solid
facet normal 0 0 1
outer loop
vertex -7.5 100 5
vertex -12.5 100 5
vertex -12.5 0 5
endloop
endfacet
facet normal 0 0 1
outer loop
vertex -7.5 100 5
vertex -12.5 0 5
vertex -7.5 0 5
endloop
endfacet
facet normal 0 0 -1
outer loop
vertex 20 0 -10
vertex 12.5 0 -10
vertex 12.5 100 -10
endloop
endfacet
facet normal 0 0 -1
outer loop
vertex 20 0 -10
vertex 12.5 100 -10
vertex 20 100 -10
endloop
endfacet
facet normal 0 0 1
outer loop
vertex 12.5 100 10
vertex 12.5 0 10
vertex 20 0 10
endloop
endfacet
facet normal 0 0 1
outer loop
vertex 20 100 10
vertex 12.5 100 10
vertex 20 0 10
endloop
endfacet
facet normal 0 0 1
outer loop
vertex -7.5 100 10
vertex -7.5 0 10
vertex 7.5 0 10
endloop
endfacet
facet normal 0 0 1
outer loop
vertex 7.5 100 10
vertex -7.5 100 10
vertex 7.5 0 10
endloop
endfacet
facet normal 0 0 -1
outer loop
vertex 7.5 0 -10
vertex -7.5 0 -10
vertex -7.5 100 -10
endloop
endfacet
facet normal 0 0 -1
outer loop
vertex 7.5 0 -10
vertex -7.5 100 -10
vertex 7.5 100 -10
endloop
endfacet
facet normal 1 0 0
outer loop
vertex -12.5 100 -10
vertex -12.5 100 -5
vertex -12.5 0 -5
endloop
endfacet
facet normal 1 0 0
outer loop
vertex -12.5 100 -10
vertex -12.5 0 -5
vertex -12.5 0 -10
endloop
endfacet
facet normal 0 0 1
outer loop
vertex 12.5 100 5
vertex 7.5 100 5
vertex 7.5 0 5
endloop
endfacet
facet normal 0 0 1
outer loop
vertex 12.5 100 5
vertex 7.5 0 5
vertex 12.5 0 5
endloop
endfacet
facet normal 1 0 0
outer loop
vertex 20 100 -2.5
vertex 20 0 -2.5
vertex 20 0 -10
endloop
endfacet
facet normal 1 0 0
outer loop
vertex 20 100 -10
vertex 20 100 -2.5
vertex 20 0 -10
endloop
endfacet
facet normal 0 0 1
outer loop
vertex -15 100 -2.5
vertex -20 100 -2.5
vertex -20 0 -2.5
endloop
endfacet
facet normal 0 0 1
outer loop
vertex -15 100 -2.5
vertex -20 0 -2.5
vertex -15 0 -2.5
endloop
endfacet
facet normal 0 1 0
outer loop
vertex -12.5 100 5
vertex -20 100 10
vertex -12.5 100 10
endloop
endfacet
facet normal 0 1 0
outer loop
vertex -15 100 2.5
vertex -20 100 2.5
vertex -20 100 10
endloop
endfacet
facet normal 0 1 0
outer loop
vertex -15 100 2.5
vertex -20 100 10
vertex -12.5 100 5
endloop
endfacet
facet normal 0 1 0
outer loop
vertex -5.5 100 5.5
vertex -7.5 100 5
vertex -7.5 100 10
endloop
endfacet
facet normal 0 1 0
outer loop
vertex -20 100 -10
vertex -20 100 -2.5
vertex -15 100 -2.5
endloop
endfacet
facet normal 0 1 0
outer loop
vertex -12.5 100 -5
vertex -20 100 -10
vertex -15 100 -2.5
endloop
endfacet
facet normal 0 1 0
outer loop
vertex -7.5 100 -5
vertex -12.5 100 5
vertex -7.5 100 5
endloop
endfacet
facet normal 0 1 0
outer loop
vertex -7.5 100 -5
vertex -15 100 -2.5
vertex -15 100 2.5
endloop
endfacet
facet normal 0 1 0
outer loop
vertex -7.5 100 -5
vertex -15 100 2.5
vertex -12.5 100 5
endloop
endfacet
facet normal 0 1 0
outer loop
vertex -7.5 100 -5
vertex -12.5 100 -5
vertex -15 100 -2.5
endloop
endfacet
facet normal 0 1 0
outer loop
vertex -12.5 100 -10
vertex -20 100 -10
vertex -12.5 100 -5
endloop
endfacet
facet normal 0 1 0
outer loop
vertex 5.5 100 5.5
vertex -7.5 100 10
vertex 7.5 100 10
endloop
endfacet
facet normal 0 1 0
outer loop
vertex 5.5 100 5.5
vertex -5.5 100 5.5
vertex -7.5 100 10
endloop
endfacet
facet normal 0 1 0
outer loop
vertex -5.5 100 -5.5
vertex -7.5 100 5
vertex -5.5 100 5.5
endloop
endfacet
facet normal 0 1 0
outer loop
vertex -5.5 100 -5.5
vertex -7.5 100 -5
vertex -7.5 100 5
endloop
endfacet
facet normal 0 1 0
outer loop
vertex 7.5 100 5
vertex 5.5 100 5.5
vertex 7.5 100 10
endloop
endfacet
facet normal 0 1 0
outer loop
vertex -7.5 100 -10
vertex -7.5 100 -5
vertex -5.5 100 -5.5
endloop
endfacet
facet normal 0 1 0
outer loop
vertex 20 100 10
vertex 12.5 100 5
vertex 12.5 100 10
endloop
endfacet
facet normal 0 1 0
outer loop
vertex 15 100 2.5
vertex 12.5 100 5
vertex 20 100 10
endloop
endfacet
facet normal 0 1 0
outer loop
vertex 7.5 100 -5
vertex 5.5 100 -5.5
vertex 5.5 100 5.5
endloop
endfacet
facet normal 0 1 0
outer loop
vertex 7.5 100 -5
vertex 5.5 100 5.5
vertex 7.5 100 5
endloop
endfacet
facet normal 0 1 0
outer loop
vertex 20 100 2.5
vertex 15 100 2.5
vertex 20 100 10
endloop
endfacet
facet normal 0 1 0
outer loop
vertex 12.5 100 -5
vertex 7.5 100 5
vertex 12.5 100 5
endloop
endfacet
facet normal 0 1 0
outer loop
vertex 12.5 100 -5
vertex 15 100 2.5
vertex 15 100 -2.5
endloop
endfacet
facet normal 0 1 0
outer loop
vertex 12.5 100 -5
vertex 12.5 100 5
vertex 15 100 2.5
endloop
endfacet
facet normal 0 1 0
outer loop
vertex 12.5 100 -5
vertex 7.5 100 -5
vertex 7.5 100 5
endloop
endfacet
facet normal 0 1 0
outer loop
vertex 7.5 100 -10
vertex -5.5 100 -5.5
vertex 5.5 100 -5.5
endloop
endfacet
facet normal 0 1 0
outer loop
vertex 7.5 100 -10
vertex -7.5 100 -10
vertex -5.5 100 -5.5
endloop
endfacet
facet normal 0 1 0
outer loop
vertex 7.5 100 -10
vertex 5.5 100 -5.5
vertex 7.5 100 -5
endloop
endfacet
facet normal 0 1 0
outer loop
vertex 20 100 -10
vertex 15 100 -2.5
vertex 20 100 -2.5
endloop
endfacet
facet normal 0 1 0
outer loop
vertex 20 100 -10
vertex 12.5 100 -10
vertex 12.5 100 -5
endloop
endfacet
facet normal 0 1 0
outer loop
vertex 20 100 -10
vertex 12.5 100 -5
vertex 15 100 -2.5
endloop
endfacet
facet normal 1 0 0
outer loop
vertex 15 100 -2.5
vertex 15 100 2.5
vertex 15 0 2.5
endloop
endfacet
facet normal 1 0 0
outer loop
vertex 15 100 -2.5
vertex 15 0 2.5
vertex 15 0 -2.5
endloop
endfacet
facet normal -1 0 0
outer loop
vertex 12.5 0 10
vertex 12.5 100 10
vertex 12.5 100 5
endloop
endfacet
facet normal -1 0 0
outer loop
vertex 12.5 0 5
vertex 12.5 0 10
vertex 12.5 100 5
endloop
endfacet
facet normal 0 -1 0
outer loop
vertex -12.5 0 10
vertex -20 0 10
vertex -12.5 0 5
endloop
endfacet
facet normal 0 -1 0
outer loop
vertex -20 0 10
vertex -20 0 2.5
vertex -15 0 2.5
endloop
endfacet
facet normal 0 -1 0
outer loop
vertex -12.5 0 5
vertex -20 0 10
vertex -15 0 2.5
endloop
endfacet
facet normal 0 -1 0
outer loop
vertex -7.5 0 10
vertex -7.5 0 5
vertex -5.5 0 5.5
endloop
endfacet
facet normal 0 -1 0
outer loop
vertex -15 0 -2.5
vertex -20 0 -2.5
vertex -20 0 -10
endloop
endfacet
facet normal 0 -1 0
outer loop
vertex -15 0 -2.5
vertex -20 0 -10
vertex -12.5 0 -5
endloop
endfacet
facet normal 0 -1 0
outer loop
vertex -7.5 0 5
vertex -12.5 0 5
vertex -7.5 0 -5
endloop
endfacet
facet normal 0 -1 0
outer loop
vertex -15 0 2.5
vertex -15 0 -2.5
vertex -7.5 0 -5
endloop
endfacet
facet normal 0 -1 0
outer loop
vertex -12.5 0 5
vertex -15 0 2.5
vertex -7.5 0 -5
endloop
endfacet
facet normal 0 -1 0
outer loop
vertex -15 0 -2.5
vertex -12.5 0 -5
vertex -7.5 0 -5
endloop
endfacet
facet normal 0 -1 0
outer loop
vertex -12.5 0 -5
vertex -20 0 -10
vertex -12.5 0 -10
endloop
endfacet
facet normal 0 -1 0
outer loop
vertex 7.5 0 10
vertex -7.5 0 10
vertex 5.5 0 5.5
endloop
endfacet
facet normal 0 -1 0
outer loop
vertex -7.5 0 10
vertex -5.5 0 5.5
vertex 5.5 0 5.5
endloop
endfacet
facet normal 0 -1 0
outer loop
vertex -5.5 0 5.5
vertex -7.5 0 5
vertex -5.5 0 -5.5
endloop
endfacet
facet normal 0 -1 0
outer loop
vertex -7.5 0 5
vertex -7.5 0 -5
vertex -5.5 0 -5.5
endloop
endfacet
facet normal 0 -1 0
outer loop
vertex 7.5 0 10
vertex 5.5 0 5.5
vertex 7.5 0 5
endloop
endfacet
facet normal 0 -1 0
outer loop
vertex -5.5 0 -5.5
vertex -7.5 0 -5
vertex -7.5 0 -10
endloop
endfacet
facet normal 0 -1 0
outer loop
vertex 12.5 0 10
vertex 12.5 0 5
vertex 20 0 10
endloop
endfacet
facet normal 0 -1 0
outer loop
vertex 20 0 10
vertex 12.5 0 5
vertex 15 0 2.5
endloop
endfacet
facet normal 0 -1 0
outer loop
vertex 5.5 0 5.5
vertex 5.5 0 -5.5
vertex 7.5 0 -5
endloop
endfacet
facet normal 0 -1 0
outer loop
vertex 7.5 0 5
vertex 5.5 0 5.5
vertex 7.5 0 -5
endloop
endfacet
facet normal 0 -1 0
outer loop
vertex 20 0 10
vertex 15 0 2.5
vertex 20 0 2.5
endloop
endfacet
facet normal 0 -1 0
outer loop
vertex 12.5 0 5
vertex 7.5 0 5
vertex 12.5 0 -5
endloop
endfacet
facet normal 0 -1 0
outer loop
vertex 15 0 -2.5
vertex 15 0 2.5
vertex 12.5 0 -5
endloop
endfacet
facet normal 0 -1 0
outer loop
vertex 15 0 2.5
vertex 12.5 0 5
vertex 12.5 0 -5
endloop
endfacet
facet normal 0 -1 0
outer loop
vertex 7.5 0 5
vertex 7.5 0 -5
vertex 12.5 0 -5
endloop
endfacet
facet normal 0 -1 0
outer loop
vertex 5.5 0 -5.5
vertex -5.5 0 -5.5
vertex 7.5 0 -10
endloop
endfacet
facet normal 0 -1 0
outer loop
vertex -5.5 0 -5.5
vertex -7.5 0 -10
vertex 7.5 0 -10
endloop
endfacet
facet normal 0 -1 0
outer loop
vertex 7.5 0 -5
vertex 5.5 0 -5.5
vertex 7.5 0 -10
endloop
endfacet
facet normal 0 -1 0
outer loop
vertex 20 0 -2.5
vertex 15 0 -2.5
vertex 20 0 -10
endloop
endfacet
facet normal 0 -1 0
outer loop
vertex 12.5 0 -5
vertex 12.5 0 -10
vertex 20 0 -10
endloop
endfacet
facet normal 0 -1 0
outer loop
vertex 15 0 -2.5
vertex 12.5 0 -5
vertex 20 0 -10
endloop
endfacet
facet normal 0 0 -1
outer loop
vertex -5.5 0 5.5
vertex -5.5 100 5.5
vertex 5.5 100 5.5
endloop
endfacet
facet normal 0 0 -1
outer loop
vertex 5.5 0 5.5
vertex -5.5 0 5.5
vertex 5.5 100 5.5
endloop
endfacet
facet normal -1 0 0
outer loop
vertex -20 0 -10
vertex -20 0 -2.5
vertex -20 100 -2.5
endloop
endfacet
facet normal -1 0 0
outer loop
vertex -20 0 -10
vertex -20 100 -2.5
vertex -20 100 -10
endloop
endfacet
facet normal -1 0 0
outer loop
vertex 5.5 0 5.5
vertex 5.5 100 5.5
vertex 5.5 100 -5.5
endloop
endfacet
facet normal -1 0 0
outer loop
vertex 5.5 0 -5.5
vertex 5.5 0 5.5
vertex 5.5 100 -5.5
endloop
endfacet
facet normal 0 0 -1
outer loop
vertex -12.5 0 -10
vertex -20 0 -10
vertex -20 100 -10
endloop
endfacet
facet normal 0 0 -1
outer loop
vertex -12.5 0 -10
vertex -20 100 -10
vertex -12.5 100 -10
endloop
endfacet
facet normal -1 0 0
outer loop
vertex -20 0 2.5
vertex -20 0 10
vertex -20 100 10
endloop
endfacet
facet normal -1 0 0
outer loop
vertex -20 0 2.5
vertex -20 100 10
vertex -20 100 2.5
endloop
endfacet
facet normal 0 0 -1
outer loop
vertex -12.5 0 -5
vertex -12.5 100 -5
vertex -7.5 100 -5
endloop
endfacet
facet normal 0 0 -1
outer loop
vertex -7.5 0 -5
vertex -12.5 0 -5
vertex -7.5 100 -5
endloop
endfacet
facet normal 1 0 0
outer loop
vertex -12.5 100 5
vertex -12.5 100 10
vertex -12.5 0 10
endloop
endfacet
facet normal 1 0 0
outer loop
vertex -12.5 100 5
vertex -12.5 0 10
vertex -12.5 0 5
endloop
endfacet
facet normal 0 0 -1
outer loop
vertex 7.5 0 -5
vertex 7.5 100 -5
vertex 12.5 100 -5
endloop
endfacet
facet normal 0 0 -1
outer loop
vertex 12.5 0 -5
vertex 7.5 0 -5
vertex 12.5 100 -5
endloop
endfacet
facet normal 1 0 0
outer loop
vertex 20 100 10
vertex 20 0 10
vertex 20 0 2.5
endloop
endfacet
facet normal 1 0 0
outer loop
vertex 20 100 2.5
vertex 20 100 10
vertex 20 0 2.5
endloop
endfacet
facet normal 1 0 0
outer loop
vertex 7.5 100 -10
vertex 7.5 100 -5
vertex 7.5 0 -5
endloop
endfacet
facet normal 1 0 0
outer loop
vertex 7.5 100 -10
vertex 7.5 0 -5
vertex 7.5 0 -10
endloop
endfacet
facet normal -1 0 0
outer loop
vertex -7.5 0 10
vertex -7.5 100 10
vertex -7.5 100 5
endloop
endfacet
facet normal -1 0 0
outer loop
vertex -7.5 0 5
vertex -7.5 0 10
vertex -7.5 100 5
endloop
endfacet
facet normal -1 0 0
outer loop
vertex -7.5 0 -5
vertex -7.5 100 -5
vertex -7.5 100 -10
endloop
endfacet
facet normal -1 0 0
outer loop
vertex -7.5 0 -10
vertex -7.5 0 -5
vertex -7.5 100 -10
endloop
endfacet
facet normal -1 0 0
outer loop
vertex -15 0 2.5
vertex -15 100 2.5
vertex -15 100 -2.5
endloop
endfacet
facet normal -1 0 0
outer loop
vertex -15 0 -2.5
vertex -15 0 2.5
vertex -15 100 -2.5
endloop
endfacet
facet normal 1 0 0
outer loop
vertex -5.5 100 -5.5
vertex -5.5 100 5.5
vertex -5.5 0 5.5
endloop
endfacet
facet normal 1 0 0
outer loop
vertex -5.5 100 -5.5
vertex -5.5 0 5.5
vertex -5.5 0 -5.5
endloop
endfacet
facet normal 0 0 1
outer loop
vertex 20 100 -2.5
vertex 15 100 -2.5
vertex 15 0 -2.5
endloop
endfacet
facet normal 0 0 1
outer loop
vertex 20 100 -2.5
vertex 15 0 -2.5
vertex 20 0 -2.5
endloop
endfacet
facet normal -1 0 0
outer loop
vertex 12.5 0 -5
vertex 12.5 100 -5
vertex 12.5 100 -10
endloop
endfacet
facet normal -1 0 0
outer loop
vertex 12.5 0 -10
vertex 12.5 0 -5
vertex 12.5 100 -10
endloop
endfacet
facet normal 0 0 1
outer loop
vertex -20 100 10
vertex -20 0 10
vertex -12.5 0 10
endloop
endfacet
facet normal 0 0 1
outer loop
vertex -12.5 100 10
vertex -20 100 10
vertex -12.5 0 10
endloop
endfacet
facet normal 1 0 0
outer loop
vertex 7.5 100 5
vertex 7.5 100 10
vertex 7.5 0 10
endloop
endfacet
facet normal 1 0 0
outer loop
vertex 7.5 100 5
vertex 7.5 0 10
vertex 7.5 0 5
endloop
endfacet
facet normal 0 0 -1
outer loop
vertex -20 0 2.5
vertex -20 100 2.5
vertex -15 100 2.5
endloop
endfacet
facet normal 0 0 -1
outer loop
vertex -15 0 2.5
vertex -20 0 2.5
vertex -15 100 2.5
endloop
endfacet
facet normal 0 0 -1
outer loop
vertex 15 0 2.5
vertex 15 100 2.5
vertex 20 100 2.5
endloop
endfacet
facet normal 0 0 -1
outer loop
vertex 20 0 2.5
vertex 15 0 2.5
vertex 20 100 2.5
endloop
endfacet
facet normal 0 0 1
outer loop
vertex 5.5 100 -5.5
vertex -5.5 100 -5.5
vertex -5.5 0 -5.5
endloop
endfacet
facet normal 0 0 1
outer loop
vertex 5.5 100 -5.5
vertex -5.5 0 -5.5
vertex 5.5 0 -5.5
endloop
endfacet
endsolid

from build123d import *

# Parameters (mm, degrees)
SKETCH1_W       = 40
SKETCH1_H       = 20
BODY_DEPTH      = 100
SKETCH2_W       = 5
SKETCH2_H       = 5
SKETCH2_W_2     = 11
SKETCH2_H_2     = 11
PROFILAGE_DEPTH = 103.46950766


with BuildPart() as part:
    # Sketch1 → Body (new body)
    with BuildSketch(Plane(origin=(0, 0, 0), x_dir=(1, 0, 0), z_dir=(0, 1, 0))):
        Rectangle(SKETCH1_W, SKETCH1_H)
    extrude(amount=BODY_DEPTH)

    # Sketch2 → Profilage (cut, through all)
    with BuildSketch(Plane(origin=(0, 100, 0), x_dir=(1, 0, 0), z_dir=(0, 1, 0))):
        with Locations((-10, 7.5)):
            Rectangle(SKETCH2_W, SKETCH2_H)
        with Locations((-17.5, 0)):
            Rectangle(SKETCH2_W, SKETCH2_H)
        with Locations((-10, -7.5)):
            Rectangle(SKETCH2_W, SKETCH2_H)
        with Locations((10, -7.5)):
            Rectangle(SKETCH2_W, SKETCH2_H)
        with Locations((17.5, 0)):
            Rectangle(SKETCH2_W, SKETCH2_H)
        with Locations((10, 7.5)):
            Rectangle(SKETCH2_W, SKETCH2_H)
        Rectangle(SKETCH2_W_2, SKETCH2_H_2)
    extrude(amount=-PROFILAGE_DEPTH, mode=Mode.SUBTRACT)


solid = part.part
